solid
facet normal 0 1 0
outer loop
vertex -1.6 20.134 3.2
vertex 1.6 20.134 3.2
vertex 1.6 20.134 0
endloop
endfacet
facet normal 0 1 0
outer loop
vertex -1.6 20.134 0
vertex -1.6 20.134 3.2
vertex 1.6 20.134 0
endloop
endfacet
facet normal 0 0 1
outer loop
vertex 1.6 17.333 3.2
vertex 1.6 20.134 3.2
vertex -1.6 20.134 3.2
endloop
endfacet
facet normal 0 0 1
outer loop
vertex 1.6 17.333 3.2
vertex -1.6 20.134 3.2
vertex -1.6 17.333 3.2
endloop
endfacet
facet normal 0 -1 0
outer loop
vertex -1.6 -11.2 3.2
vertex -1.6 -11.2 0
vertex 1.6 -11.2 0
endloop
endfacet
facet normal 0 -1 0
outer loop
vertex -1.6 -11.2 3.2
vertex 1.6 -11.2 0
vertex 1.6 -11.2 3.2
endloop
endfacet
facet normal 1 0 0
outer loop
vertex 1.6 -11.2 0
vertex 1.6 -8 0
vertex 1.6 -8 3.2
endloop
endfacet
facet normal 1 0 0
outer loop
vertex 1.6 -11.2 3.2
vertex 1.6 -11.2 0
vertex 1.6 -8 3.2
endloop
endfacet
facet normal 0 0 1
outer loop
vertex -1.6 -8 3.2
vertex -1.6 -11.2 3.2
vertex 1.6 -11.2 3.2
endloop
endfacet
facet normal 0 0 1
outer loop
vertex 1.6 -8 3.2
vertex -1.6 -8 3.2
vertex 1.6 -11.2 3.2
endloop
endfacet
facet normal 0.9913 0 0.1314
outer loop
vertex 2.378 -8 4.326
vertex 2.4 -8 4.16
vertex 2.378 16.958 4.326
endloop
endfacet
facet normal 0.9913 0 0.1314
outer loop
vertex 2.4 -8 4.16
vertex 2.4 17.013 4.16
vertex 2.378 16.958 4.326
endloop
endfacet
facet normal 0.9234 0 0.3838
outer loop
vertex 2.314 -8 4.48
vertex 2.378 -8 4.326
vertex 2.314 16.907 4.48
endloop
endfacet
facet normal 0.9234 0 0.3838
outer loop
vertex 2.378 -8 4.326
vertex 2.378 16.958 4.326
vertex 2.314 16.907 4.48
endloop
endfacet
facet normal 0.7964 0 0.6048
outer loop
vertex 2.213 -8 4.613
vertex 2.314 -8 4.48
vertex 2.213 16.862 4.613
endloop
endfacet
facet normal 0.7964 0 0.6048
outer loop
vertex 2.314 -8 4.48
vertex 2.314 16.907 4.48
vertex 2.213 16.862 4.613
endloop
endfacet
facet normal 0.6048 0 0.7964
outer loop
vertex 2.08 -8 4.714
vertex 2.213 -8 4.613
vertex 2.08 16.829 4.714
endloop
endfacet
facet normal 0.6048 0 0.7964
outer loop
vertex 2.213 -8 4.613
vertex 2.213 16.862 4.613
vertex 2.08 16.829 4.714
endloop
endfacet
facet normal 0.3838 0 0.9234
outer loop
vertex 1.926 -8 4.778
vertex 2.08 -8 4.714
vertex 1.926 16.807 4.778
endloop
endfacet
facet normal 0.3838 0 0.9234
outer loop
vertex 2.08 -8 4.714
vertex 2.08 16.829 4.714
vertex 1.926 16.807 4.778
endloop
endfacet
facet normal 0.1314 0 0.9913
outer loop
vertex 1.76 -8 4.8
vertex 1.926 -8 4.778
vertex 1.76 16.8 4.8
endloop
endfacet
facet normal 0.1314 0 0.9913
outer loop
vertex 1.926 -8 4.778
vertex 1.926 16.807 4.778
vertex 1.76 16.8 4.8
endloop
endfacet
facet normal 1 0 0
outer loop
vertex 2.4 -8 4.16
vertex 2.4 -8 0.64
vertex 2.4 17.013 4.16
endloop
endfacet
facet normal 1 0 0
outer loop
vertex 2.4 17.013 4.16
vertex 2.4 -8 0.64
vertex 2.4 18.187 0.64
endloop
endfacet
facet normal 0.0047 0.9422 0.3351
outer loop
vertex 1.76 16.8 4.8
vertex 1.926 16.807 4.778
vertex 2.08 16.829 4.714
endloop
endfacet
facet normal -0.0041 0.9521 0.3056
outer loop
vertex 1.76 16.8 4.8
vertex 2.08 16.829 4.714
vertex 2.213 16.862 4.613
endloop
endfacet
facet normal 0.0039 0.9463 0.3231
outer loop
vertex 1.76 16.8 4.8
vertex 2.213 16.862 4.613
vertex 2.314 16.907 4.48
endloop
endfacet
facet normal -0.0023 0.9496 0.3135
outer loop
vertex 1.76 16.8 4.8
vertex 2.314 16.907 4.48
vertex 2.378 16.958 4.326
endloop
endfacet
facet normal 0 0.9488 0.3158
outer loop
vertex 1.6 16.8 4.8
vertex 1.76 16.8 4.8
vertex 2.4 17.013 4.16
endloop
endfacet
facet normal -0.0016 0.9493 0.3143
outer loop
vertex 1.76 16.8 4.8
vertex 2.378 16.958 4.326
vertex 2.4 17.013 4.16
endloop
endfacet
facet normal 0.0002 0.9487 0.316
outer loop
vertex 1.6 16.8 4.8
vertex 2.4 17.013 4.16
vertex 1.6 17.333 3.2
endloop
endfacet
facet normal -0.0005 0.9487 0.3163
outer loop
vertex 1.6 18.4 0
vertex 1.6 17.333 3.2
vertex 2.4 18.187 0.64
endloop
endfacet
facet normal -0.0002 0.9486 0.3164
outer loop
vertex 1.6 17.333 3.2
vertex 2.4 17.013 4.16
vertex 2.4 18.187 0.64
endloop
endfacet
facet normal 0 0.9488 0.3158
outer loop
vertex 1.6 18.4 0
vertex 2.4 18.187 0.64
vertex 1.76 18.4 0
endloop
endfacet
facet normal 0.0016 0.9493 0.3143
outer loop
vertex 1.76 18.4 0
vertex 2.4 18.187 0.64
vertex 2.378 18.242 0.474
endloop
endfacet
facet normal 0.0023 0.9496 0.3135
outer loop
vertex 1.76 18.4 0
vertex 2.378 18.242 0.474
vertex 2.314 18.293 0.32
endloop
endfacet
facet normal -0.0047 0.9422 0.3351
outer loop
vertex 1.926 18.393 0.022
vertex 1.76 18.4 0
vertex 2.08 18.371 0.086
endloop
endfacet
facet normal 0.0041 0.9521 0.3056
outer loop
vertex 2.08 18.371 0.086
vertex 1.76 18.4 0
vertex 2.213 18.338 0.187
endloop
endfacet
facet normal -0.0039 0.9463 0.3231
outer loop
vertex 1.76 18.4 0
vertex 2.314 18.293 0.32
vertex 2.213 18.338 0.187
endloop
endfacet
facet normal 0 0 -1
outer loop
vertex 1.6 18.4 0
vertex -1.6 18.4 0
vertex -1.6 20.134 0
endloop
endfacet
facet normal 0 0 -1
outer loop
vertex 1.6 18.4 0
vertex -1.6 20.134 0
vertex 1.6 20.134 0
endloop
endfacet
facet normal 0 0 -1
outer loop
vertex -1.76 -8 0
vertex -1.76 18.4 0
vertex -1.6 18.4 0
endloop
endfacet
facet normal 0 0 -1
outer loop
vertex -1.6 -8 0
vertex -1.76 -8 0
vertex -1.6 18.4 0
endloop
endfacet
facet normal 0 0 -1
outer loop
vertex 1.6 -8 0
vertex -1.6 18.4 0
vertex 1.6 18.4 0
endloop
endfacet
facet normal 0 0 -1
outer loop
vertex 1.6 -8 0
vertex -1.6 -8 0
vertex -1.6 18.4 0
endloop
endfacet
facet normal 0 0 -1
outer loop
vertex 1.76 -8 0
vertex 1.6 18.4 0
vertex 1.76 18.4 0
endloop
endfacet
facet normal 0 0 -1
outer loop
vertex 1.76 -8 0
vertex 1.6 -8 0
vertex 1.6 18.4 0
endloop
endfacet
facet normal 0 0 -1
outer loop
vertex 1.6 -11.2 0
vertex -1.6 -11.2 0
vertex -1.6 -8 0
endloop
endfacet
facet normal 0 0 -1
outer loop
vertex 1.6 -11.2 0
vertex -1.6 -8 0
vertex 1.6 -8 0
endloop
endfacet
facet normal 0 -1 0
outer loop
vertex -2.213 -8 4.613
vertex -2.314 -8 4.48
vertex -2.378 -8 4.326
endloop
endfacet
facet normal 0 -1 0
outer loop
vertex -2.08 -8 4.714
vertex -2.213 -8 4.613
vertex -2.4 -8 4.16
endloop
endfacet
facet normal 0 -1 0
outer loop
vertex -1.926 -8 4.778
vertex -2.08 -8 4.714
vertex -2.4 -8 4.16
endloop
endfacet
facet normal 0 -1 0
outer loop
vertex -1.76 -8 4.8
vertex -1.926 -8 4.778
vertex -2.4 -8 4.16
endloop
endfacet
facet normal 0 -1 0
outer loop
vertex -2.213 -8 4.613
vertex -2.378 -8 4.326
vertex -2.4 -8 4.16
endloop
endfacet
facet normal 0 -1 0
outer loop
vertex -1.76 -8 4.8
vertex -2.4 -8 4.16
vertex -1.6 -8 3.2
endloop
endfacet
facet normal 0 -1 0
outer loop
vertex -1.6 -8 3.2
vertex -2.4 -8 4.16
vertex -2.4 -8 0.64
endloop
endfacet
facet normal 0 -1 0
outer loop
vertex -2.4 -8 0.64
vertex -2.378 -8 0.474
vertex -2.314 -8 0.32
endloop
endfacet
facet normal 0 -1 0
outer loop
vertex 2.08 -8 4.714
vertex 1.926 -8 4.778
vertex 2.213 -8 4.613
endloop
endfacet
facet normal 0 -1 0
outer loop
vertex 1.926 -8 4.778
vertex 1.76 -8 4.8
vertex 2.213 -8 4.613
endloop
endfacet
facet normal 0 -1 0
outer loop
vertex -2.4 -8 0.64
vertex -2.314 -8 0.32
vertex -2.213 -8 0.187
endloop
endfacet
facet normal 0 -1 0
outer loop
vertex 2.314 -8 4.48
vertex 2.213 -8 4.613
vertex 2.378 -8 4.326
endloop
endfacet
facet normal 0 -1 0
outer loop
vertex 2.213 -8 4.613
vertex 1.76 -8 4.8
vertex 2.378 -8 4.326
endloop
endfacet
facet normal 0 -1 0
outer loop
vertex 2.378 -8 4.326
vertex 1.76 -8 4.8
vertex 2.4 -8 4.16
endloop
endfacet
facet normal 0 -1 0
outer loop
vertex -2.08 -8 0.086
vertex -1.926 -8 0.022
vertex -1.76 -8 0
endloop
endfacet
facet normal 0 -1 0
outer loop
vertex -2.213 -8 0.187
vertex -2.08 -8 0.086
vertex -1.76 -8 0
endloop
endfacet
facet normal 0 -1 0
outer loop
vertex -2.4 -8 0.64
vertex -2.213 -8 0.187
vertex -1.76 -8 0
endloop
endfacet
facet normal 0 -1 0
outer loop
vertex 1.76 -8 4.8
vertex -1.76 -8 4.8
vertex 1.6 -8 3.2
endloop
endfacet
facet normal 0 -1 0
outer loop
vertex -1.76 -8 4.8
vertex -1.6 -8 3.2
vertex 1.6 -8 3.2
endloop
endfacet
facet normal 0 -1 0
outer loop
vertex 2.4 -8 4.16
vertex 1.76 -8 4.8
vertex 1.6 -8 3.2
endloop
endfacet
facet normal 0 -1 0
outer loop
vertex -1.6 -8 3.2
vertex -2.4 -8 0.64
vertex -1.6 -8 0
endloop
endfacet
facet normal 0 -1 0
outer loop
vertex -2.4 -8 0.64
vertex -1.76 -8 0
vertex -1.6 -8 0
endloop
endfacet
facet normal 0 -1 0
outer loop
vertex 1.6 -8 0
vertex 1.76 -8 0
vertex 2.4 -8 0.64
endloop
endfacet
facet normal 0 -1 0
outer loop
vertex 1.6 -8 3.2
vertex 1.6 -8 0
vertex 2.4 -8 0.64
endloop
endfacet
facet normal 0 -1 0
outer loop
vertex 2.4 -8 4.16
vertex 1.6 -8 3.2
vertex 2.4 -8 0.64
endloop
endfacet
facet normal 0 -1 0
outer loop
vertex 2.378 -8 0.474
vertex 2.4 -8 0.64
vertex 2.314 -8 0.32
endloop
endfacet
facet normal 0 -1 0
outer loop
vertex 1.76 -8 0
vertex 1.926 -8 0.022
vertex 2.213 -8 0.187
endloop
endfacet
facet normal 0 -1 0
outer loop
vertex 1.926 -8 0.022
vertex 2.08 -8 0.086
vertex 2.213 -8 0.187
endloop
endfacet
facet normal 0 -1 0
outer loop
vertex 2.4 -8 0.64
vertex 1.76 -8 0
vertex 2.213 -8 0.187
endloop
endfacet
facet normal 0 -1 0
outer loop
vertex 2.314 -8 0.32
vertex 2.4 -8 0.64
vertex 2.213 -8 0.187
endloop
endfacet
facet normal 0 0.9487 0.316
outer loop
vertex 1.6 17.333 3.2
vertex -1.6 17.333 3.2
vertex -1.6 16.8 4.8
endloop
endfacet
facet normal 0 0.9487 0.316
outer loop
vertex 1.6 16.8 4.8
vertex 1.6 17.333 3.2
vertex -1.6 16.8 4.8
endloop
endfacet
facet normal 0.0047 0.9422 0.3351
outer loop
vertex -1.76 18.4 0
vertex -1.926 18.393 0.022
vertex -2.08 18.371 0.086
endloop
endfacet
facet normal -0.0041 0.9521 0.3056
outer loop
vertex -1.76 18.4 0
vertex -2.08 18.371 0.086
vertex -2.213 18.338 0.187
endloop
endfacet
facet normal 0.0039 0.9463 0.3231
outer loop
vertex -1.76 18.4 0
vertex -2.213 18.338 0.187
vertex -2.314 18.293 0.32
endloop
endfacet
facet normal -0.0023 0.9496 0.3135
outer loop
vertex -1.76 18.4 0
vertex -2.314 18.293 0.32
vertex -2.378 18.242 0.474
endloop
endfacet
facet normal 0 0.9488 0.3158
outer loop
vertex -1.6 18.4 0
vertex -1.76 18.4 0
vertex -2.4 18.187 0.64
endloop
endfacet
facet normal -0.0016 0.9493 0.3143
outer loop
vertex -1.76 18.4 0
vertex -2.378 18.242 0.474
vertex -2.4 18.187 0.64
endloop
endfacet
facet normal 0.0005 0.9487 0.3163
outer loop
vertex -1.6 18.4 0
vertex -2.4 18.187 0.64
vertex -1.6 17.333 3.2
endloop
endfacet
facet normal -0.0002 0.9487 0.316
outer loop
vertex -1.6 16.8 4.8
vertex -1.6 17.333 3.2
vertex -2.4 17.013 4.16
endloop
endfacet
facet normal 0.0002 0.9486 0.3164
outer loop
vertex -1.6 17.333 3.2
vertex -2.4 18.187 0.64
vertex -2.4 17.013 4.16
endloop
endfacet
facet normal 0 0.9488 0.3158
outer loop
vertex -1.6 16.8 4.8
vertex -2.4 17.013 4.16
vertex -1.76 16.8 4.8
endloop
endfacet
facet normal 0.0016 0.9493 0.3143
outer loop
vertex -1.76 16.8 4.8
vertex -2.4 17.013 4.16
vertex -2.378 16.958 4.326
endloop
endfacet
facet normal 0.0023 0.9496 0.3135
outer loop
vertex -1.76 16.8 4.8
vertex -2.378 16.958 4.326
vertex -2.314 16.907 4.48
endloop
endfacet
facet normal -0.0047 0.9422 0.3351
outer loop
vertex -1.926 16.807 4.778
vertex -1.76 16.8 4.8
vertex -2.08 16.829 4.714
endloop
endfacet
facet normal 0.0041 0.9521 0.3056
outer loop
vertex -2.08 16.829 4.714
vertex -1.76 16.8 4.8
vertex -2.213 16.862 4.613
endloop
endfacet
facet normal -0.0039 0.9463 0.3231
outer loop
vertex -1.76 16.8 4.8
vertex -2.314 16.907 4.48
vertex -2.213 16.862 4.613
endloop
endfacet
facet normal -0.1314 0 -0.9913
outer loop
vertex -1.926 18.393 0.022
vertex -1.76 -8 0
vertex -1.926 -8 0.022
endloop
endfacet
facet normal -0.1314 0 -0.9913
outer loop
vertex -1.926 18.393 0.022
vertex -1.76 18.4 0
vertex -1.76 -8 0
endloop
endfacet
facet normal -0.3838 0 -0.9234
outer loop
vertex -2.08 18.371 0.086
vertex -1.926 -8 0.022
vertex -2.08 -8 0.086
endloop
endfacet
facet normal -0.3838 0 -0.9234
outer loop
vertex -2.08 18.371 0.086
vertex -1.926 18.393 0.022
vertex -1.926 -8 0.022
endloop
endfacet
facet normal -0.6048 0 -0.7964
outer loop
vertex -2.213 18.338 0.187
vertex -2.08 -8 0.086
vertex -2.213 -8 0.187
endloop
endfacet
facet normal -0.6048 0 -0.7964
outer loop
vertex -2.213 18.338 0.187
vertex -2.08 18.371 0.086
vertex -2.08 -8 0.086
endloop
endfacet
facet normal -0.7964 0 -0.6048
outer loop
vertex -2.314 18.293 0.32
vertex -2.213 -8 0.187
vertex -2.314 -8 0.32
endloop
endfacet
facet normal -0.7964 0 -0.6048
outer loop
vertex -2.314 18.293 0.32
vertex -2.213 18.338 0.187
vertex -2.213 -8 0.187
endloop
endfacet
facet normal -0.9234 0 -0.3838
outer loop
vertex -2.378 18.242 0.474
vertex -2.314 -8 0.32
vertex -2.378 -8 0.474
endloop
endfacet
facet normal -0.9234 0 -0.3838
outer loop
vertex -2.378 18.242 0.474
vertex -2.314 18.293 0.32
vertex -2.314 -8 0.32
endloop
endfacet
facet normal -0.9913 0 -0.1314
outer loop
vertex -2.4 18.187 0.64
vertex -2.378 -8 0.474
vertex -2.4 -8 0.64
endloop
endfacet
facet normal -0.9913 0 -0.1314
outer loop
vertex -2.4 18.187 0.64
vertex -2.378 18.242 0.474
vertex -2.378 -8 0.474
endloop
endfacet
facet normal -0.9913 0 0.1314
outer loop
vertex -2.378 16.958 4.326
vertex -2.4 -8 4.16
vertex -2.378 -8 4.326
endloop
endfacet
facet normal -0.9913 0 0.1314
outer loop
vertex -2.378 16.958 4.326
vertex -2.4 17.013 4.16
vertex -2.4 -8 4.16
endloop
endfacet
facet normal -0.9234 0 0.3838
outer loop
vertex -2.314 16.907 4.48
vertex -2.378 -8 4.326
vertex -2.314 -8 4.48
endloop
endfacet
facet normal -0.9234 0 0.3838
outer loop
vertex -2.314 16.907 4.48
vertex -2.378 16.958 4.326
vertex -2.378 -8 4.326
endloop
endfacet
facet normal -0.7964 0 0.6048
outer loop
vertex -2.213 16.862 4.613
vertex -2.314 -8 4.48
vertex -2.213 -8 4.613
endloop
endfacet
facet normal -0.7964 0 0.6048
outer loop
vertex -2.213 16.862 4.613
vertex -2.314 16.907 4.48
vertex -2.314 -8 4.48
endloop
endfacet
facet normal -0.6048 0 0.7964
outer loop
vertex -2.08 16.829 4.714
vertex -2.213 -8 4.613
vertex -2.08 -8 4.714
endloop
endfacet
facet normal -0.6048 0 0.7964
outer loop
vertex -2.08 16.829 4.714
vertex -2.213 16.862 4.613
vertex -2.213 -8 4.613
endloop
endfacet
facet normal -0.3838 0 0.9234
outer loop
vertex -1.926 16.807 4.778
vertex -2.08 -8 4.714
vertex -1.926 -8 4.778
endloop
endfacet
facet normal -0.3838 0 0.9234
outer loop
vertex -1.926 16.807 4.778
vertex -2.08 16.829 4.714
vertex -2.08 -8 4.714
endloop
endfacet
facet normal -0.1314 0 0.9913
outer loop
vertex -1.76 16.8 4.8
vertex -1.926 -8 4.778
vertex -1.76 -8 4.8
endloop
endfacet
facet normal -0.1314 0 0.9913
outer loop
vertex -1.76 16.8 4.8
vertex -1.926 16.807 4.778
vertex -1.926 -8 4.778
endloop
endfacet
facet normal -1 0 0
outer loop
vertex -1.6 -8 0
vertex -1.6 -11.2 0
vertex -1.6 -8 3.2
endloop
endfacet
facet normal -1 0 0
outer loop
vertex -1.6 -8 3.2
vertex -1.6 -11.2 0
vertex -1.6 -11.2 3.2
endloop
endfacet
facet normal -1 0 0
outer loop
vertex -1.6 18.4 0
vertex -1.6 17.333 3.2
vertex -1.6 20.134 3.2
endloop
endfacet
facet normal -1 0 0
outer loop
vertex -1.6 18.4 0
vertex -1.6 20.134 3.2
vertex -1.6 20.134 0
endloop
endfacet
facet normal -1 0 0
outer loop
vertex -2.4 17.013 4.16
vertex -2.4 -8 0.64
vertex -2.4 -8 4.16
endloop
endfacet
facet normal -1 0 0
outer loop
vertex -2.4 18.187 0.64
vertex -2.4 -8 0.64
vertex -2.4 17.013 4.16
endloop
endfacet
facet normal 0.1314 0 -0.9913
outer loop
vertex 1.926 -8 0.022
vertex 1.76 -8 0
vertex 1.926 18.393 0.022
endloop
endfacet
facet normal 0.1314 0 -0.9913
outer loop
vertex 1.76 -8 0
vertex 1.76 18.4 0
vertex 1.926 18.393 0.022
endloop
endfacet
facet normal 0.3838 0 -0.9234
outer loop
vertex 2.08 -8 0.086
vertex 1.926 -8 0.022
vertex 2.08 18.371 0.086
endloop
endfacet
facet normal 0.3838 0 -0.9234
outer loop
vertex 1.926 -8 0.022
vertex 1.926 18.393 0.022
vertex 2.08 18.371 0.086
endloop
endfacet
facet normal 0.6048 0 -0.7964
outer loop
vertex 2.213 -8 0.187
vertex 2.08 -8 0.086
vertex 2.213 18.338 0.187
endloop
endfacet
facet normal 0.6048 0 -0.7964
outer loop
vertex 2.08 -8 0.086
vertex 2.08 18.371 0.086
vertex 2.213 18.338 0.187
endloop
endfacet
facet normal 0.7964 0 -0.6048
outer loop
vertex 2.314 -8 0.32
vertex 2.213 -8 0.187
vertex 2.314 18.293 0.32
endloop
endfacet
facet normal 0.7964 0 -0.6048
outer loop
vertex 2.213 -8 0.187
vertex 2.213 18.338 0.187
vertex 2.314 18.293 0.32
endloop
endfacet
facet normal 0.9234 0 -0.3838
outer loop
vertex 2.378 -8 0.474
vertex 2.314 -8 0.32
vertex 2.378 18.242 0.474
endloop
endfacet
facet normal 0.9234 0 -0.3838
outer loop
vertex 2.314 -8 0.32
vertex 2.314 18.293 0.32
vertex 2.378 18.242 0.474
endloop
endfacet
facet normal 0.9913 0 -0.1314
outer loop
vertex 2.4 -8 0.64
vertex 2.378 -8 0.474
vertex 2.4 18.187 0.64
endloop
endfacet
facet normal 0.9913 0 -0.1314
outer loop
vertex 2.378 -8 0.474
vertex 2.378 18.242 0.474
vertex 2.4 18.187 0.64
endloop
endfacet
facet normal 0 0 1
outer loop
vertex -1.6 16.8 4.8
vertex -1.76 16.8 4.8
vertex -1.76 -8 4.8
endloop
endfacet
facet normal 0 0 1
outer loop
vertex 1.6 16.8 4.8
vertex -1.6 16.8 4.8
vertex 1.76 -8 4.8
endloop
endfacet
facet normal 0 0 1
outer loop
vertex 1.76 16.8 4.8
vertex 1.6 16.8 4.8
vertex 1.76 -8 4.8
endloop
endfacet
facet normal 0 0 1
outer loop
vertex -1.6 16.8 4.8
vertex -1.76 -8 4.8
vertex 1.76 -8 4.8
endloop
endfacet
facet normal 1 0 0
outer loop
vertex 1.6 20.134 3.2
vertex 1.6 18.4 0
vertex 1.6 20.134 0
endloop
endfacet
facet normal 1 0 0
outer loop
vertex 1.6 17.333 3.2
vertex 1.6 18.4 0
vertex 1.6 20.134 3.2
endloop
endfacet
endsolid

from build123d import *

# Parameters (mm, degrees)
F0_W      = 6
F0_H      = 50
F1_DEPTH  = 6
F2_W      = 4
F2_H      = 4
F3_DEPTH  = 5
F5_DEPTH  = 1
F7_DEPTH  = 1
F8_DEPTH  = 4
F10_DEPTH = 25
F11_W     = 1
F11_H     = 4
F12_DEPTH = 25
F13_DEPTH = 15
F14_DEPTH = 15
F16_DEPTH = 1
F18_DEPTH = 1
F20_DEPTH = 4
F21_DEPTH = 1.333
F22_R     = 0.8
F23_SCALE = 0.8


with BuildPart() as f1:
    # F0 (on Top) → F1 (new body)
    with BuildSketch(Plane.XY):
        Rectangle(F0_W, F0_H)
    extrude(amount=F1_DEPTH)

    # F2 (on face) → F3 (join)
    with BuildSketch(Plane.XZ.offset(25)):
        with Locations((0, 2)):
            Rectangle(F2_W, F2_H)
    extrude(amount=F3_DEPTH)

    # F4 (on face) → F5 (cut)
    with BuildSketch(Plane(origin=(-3, 0, 0), x_dir=(0, -1, 0), z_dir=(-1, 0, 0))):
        Polygon((-25, 6), (-25, 0), (-23, 0), align=None)
    extrude(amount=-F5_DEPTH, mode=Mode.SUBTRACT)

    # F6 (on face) → F7 (cut)
    with BuildSketch(Plane.YZ.offset(3)):
        Polygon((23, 0), (25, 0), (25, 6), align=None)
    extrude(amount=-F7_DEPTH, mode=Mode.SUBTRACT)

    # F8 (add): a face of the model
    f8_faces = [f1.faces().sort_by_distance(p)[0] for p in [
        (0, 25, 3),
    ]]
    extrude(f8_faces, amount=F8_DEPTH)

    # F9 (on face) → F10 (cut)
    with BuildSketch(Plane.YZ.offset(2)):
        Polygon((26.5, 4), (26.5, 0), (29, 0), (29, 6), (25, 6), (24.3333333333, 4), align=None)
    extrude(amount=-F10_DEPTH, mode=Mode.SUBTRACT)

    # F11 (on face) → F12 (cut)
    with BuildSketch(Plane(origin=(-2, 0, 0), x_dir=(0, -1, 0), z_dir=(-1, 0, 0))):
        with Locations((29.5, 2)):
            Rectangle(F11_W, F11_H)
    extrude(amount=-F12_DEPTH, mode=Mode.SUBTRACT)

    # F13 (cut): a face of the model
    f13_faces = [f1.faces().sort_by_distance(p)[0] for p in [
        (-2.5, -25, 0.0848528137),
    ]]
    extrude(f13_faces, amount=-F13_DEPTH, mode=Mode.SUBTRACT)

    # F14 (cut): a face of the model
    f14_faces = [f1.faces().sort_by_distance(p)[0] for p in [
        (0, -29, 2),
    ]]
    extrude(f14_faces, amount=-F14_DEPTH, mode=Mode.SUBTRACT)

    # F15 (on face) → F16 (cut)
    with BuildSketch(Plane.YZ.offset(3)):
        Polygon((23, 0), (25, 6), (21, 6), align=None)
    extrude(amount=-F16_DEPTH, mode=Mode.SUBTRACT)

    # F17 (on face) → F18 (cut)
    with BuildSketch(Plane(origin=(-3, 0, 0), x_dir=(0, -1, 0), z_dir=(-1, 0, 0))):
        Polygon((-21, 6), (-25, 6), (-23, 0), align=None)
    extrude(amount=-F18_DEPTH, mode=Mode.SUBTRACT)

    # F19 (on face) → F20 (cut)
    with BuildSketch(Plane(origin=(-2, 0, 0), x_dir=(0, -1, 0), z_dir=(-1, 0, 0))):
        Polygon((-25, 6), (-24.3333333333, 4), (-21.6666666667, 4), (-21, 6), align=None)
    extrude(amount=-F20_DEPTH, mode=Mode.SUBTRACT)

    # F21 (cut): a face of the model
    f21_faces = [f1.faces().sort_by_distance(p)[0] for p in [
        (0, 26.5, 2),
    ]]
    extrude(f21_faces, amount=-F21_DEPTH, mode=Mode.SUBTRACT)

    # F22
    f22_edges = [f1.edges().sort_by_distance(p)[0] for p in [
        (3, 5.5, 6),
        (3, 6.5, 0),
        (-3, 5.5, 6),
        (-3, 6.5, 0),
    ]]
    fillet(f22_edges, radius=F22_R)


with BuildPart() as f1_1:
    # F23: moved
    add(f1.part.scale(F23_SCALE))


solid = f1_1.part
